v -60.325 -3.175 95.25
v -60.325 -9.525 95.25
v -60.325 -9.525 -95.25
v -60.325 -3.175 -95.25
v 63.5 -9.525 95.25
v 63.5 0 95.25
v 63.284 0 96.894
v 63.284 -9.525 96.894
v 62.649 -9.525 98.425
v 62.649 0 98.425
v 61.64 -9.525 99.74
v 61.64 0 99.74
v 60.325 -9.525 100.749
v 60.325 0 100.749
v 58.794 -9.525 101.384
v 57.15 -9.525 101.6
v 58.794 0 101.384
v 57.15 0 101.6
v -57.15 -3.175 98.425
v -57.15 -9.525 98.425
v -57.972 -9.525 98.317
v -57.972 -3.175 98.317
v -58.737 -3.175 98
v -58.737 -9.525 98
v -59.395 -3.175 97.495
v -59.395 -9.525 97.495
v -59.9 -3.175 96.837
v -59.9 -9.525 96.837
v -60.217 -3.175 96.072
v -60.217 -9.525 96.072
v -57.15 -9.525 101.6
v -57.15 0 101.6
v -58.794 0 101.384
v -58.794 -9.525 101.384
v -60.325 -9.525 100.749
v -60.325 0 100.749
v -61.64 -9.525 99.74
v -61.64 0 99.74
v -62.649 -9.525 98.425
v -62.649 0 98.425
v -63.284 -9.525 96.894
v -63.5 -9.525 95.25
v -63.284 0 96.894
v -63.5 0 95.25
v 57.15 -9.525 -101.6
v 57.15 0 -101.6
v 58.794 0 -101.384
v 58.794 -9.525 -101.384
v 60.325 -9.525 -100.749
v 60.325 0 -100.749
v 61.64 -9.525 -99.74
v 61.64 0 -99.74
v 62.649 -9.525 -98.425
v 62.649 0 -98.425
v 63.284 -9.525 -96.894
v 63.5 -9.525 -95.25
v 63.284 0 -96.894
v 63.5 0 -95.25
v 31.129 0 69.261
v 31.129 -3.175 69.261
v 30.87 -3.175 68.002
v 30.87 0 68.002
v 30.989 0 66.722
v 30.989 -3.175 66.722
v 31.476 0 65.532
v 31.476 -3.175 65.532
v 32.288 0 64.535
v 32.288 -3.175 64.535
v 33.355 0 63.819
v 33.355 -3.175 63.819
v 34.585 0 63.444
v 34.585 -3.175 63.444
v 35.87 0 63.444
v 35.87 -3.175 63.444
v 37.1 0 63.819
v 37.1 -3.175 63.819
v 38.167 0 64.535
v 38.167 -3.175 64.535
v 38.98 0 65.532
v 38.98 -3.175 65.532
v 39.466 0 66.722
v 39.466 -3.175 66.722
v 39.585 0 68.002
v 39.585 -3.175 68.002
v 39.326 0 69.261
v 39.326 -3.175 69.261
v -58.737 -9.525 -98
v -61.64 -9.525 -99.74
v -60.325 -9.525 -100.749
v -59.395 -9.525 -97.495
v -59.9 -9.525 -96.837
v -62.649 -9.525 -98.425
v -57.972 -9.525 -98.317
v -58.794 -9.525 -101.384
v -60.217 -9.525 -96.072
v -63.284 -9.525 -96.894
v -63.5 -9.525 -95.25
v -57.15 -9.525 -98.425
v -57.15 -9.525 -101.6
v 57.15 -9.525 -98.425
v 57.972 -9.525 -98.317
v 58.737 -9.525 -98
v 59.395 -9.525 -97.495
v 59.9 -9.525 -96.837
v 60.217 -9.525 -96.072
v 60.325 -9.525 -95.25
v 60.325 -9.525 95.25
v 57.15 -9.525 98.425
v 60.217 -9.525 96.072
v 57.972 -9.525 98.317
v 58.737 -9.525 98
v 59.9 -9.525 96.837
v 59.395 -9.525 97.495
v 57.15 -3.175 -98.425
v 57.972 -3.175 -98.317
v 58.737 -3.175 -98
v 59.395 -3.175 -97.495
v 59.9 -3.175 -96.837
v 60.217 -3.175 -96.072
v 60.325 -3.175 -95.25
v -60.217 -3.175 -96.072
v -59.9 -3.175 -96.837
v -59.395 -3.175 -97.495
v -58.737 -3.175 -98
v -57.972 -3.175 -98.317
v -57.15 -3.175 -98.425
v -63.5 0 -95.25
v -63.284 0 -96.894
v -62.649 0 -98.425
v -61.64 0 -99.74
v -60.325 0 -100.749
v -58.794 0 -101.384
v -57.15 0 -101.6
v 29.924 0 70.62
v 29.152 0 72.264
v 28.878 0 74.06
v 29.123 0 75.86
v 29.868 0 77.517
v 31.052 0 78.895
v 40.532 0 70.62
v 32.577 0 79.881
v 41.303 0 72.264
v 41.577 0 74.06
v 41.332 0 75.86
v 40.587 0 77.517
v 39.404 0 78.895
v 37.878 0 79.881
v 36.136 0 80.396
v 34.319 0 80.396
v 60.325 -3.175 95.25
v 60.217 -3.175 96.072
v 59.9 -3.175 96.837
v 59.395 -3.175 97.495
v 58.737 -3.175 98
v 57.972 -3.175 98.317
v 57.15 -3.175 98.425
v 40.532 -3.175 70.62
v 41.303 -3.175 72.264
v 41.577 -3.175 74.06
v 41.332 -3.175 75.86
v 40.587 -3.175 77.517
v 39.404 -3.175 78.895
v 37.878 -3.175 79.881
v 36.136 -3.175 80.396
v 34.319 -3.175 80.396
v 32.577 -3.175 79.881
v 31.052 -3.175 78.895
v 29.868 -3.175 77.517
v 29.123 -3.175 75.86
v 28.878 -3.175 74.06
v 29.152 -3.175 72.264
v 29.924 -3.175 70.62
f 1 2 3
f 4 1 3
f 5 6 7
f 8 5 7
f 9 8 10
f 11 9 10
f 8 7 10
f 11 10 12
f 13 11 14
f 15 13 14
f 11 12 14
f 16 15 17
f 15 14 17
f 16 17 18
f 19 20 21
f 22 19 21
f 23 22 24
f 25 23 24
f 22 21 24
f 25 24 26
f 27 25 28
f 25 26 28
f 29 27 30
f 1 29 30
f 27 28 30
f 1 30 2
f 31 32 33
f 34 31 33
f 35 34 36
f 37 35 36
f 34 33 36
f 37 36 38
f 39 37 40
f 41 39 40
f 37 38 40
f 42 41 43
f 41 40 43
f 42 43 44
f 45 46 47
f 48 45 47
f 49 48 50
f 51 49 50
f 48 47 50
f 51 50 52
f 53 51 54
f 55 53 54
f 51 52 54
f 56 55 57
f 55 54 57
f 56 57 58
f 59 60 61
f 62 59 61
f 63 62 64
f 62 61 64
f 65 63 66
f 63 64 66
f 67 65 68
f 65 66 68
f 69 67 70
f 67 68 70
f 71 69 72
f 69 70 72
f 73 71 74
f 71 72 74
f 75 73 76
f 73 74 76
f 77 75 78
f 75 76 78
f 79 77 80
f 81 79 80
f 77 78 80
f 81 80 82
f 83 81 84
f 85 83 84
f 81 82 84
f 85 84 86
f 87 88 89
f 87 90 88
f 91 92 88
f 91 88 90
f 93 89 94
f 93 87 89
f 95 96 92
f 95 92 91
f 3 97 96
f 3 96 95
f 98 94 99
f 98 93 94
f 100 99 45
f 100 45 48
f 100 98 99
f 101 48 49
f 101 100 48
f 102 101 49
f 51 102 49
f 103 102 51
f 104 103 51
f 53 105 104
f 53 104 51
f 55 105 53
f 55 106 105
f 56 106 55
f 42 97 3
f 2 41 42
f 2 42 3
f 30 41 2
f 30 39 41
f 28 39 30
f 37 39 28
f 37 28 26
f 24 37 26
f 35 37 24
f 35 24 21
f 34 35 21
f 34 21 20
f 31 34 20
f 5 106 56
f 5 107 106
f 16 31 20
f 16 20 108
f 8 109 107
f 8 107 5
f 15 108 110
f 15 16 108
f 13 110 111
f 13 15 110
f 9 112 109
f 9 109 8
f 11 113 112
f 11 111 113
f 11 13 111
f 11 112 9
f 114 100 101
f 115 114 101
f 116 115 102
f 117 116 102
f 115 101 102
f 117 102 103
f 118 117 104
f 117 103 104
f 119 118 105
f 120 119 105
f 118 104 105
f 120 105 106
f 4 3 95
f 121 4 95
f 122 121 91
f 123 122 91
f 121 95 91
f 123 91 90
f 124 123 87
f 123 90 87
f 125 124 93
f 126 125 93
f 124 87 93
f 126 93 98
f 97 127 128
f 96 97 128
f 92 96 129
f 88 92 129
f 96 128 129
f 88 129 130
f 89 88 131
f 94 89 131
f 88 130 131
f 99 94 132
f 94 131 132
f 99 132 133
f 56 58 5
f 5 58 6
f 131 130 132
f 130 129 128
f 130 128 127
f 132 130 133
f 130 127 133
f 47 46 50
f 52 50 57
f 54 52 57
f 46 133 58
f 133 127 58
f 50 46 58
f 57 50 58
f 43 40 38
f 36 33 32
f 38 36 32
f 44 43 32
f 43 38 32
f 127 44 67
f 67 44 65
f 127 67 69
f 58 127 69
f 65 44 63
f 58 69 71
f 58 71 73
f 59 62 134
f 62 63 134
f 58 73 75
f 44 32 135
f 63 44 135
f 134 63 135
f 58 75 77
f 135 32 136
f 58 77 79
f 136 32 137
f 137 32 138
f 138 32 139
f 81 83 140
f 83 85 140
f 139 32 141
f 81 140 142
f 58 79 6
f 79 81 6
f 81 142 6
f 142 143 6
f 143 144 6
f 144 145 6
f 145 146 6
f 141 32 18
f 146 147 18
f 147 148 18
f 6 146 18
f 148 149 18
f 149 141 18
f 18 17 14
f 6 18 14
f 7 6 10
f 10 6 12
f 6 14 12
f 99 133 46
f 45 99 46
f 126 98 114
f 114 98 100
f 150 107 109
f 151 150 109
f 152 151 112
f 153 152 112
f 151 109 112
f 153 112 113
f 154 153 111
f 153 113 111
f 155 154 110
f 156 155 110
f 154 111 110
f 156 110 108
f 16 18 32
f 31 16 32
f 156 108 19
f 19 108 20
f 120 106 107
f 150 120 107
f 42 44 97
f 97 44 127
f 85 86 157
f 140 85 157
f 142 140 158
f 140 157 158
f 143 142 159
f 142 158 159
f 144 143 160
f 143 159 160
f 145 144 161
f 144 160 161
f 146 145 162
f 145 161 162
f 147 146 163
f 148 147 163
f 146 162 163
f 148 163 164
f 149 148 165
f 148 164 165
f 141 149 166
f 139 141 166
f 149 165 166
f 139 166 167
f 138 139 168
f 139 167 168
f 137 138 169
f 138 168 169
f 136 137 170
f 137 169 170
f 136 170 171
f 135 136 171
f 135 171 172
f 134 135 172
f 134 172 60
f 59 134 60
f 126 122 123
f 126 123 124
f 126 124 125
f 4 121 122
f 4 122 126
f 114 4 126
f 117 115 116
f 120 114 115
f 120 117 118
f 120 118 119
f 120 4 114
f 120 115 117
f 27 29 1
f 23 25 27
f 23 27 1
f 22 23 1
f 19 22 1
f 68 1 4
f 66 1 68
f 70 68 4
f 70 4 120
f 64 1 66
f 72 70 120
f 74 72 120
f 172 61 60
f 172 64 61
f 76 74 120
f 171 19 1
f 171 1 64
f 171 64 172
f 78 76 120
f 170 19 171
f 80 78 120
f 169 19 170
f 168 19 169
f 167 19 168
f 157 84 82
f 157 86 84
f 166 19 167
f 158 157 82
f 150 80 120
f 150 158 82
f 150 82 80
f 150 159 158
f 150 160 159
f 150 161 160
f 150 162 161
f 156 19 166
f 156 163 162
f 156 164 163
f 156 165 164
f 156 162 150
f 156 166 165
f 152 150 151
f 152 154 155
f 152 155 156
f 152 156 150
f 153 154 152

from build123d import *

# Parameters (mm, degrees)
F1_DEPTH = 9.525
F3_DEPTH = 6.35
F5_DEPTH = 3.175


with BuildPart() as f1:
    # F0 (on Front) → F1 (new body)
    with BuildSketch(Plane.XZ):
        with BuildLine():
            ThreePointArc((63.5, 95.25), (61.640128, 99.740128), (57.15, 101.6))
            Line((57.15, 101.6), (-57.15, 101.6))
            ThreePointArc((-57.15, 101.6), (-61.640128, 99.740128), (-63.5, 95.25))
            Line((-63.5, 95.25), (-63.5, -95.25))
            ThreePointArc((-63.5, -95.25), (-61.640128, -99.740128), (-57.15, -101.6))
            Line((-57.15, -101.6), (57.15, -101.6))
            ThreePointArc((57.15, -101.6), (61.640128, -99.740128), (63.5, -95.25))
            Line((63.5, -95.25), (63.5, 95.25))
        make_face()
    extrude(amount=F1_DEPTH)

    # F2 (on face) → F3 (cut)
    with BuildSketch(Plane.XZ.offset(9.525)):
        with BuildLine():
            ThreePointArc((60.325, 95.25), (59.395064, 97.495064), (57.15, 98.425))
            Line((57.15, 98.425), (-57.15, 98.425))
            ThreePointArc((-57.15, 98.425), (-59.395064, 97.495064), (-60.325, 95.25))
            Line((-60.325, 95.25), (-60.325, -95.25))
            ThreePointArc((-60.325, -95.25), (-59.395064, -97.495064), (-57.15, -98.425))
            Line((-57.15, -98.425), (57.15, -98.425))
            ThreePointArc((57.15, -98.425), (59.395064, -97.495064), (60.325, -95.25))
            Line((60.325, -95.25), (60.325, 95.25))
        make_face()
    extrude(amount=-F3_DEPTH, mode=Mode.SUBTRACT)

    # F4 (on face) → F5 (cut, through all)
    with BuildSketch(Plane.XZ.offset(3.175)):
        with BuildLine():
            ThreePointArc((31.129177, 69.260782), (35.227664, 63.396759), (39.326151, 69.260782))
            ThreePointArc((39.326151, 69.260782), (35.227664, 80.46103), (31.129177, 69.260782))
        make_face()
    extrude(amount=-F5_DEPTH, mode=Mode.SUBTRACT)


solid = f1.part
